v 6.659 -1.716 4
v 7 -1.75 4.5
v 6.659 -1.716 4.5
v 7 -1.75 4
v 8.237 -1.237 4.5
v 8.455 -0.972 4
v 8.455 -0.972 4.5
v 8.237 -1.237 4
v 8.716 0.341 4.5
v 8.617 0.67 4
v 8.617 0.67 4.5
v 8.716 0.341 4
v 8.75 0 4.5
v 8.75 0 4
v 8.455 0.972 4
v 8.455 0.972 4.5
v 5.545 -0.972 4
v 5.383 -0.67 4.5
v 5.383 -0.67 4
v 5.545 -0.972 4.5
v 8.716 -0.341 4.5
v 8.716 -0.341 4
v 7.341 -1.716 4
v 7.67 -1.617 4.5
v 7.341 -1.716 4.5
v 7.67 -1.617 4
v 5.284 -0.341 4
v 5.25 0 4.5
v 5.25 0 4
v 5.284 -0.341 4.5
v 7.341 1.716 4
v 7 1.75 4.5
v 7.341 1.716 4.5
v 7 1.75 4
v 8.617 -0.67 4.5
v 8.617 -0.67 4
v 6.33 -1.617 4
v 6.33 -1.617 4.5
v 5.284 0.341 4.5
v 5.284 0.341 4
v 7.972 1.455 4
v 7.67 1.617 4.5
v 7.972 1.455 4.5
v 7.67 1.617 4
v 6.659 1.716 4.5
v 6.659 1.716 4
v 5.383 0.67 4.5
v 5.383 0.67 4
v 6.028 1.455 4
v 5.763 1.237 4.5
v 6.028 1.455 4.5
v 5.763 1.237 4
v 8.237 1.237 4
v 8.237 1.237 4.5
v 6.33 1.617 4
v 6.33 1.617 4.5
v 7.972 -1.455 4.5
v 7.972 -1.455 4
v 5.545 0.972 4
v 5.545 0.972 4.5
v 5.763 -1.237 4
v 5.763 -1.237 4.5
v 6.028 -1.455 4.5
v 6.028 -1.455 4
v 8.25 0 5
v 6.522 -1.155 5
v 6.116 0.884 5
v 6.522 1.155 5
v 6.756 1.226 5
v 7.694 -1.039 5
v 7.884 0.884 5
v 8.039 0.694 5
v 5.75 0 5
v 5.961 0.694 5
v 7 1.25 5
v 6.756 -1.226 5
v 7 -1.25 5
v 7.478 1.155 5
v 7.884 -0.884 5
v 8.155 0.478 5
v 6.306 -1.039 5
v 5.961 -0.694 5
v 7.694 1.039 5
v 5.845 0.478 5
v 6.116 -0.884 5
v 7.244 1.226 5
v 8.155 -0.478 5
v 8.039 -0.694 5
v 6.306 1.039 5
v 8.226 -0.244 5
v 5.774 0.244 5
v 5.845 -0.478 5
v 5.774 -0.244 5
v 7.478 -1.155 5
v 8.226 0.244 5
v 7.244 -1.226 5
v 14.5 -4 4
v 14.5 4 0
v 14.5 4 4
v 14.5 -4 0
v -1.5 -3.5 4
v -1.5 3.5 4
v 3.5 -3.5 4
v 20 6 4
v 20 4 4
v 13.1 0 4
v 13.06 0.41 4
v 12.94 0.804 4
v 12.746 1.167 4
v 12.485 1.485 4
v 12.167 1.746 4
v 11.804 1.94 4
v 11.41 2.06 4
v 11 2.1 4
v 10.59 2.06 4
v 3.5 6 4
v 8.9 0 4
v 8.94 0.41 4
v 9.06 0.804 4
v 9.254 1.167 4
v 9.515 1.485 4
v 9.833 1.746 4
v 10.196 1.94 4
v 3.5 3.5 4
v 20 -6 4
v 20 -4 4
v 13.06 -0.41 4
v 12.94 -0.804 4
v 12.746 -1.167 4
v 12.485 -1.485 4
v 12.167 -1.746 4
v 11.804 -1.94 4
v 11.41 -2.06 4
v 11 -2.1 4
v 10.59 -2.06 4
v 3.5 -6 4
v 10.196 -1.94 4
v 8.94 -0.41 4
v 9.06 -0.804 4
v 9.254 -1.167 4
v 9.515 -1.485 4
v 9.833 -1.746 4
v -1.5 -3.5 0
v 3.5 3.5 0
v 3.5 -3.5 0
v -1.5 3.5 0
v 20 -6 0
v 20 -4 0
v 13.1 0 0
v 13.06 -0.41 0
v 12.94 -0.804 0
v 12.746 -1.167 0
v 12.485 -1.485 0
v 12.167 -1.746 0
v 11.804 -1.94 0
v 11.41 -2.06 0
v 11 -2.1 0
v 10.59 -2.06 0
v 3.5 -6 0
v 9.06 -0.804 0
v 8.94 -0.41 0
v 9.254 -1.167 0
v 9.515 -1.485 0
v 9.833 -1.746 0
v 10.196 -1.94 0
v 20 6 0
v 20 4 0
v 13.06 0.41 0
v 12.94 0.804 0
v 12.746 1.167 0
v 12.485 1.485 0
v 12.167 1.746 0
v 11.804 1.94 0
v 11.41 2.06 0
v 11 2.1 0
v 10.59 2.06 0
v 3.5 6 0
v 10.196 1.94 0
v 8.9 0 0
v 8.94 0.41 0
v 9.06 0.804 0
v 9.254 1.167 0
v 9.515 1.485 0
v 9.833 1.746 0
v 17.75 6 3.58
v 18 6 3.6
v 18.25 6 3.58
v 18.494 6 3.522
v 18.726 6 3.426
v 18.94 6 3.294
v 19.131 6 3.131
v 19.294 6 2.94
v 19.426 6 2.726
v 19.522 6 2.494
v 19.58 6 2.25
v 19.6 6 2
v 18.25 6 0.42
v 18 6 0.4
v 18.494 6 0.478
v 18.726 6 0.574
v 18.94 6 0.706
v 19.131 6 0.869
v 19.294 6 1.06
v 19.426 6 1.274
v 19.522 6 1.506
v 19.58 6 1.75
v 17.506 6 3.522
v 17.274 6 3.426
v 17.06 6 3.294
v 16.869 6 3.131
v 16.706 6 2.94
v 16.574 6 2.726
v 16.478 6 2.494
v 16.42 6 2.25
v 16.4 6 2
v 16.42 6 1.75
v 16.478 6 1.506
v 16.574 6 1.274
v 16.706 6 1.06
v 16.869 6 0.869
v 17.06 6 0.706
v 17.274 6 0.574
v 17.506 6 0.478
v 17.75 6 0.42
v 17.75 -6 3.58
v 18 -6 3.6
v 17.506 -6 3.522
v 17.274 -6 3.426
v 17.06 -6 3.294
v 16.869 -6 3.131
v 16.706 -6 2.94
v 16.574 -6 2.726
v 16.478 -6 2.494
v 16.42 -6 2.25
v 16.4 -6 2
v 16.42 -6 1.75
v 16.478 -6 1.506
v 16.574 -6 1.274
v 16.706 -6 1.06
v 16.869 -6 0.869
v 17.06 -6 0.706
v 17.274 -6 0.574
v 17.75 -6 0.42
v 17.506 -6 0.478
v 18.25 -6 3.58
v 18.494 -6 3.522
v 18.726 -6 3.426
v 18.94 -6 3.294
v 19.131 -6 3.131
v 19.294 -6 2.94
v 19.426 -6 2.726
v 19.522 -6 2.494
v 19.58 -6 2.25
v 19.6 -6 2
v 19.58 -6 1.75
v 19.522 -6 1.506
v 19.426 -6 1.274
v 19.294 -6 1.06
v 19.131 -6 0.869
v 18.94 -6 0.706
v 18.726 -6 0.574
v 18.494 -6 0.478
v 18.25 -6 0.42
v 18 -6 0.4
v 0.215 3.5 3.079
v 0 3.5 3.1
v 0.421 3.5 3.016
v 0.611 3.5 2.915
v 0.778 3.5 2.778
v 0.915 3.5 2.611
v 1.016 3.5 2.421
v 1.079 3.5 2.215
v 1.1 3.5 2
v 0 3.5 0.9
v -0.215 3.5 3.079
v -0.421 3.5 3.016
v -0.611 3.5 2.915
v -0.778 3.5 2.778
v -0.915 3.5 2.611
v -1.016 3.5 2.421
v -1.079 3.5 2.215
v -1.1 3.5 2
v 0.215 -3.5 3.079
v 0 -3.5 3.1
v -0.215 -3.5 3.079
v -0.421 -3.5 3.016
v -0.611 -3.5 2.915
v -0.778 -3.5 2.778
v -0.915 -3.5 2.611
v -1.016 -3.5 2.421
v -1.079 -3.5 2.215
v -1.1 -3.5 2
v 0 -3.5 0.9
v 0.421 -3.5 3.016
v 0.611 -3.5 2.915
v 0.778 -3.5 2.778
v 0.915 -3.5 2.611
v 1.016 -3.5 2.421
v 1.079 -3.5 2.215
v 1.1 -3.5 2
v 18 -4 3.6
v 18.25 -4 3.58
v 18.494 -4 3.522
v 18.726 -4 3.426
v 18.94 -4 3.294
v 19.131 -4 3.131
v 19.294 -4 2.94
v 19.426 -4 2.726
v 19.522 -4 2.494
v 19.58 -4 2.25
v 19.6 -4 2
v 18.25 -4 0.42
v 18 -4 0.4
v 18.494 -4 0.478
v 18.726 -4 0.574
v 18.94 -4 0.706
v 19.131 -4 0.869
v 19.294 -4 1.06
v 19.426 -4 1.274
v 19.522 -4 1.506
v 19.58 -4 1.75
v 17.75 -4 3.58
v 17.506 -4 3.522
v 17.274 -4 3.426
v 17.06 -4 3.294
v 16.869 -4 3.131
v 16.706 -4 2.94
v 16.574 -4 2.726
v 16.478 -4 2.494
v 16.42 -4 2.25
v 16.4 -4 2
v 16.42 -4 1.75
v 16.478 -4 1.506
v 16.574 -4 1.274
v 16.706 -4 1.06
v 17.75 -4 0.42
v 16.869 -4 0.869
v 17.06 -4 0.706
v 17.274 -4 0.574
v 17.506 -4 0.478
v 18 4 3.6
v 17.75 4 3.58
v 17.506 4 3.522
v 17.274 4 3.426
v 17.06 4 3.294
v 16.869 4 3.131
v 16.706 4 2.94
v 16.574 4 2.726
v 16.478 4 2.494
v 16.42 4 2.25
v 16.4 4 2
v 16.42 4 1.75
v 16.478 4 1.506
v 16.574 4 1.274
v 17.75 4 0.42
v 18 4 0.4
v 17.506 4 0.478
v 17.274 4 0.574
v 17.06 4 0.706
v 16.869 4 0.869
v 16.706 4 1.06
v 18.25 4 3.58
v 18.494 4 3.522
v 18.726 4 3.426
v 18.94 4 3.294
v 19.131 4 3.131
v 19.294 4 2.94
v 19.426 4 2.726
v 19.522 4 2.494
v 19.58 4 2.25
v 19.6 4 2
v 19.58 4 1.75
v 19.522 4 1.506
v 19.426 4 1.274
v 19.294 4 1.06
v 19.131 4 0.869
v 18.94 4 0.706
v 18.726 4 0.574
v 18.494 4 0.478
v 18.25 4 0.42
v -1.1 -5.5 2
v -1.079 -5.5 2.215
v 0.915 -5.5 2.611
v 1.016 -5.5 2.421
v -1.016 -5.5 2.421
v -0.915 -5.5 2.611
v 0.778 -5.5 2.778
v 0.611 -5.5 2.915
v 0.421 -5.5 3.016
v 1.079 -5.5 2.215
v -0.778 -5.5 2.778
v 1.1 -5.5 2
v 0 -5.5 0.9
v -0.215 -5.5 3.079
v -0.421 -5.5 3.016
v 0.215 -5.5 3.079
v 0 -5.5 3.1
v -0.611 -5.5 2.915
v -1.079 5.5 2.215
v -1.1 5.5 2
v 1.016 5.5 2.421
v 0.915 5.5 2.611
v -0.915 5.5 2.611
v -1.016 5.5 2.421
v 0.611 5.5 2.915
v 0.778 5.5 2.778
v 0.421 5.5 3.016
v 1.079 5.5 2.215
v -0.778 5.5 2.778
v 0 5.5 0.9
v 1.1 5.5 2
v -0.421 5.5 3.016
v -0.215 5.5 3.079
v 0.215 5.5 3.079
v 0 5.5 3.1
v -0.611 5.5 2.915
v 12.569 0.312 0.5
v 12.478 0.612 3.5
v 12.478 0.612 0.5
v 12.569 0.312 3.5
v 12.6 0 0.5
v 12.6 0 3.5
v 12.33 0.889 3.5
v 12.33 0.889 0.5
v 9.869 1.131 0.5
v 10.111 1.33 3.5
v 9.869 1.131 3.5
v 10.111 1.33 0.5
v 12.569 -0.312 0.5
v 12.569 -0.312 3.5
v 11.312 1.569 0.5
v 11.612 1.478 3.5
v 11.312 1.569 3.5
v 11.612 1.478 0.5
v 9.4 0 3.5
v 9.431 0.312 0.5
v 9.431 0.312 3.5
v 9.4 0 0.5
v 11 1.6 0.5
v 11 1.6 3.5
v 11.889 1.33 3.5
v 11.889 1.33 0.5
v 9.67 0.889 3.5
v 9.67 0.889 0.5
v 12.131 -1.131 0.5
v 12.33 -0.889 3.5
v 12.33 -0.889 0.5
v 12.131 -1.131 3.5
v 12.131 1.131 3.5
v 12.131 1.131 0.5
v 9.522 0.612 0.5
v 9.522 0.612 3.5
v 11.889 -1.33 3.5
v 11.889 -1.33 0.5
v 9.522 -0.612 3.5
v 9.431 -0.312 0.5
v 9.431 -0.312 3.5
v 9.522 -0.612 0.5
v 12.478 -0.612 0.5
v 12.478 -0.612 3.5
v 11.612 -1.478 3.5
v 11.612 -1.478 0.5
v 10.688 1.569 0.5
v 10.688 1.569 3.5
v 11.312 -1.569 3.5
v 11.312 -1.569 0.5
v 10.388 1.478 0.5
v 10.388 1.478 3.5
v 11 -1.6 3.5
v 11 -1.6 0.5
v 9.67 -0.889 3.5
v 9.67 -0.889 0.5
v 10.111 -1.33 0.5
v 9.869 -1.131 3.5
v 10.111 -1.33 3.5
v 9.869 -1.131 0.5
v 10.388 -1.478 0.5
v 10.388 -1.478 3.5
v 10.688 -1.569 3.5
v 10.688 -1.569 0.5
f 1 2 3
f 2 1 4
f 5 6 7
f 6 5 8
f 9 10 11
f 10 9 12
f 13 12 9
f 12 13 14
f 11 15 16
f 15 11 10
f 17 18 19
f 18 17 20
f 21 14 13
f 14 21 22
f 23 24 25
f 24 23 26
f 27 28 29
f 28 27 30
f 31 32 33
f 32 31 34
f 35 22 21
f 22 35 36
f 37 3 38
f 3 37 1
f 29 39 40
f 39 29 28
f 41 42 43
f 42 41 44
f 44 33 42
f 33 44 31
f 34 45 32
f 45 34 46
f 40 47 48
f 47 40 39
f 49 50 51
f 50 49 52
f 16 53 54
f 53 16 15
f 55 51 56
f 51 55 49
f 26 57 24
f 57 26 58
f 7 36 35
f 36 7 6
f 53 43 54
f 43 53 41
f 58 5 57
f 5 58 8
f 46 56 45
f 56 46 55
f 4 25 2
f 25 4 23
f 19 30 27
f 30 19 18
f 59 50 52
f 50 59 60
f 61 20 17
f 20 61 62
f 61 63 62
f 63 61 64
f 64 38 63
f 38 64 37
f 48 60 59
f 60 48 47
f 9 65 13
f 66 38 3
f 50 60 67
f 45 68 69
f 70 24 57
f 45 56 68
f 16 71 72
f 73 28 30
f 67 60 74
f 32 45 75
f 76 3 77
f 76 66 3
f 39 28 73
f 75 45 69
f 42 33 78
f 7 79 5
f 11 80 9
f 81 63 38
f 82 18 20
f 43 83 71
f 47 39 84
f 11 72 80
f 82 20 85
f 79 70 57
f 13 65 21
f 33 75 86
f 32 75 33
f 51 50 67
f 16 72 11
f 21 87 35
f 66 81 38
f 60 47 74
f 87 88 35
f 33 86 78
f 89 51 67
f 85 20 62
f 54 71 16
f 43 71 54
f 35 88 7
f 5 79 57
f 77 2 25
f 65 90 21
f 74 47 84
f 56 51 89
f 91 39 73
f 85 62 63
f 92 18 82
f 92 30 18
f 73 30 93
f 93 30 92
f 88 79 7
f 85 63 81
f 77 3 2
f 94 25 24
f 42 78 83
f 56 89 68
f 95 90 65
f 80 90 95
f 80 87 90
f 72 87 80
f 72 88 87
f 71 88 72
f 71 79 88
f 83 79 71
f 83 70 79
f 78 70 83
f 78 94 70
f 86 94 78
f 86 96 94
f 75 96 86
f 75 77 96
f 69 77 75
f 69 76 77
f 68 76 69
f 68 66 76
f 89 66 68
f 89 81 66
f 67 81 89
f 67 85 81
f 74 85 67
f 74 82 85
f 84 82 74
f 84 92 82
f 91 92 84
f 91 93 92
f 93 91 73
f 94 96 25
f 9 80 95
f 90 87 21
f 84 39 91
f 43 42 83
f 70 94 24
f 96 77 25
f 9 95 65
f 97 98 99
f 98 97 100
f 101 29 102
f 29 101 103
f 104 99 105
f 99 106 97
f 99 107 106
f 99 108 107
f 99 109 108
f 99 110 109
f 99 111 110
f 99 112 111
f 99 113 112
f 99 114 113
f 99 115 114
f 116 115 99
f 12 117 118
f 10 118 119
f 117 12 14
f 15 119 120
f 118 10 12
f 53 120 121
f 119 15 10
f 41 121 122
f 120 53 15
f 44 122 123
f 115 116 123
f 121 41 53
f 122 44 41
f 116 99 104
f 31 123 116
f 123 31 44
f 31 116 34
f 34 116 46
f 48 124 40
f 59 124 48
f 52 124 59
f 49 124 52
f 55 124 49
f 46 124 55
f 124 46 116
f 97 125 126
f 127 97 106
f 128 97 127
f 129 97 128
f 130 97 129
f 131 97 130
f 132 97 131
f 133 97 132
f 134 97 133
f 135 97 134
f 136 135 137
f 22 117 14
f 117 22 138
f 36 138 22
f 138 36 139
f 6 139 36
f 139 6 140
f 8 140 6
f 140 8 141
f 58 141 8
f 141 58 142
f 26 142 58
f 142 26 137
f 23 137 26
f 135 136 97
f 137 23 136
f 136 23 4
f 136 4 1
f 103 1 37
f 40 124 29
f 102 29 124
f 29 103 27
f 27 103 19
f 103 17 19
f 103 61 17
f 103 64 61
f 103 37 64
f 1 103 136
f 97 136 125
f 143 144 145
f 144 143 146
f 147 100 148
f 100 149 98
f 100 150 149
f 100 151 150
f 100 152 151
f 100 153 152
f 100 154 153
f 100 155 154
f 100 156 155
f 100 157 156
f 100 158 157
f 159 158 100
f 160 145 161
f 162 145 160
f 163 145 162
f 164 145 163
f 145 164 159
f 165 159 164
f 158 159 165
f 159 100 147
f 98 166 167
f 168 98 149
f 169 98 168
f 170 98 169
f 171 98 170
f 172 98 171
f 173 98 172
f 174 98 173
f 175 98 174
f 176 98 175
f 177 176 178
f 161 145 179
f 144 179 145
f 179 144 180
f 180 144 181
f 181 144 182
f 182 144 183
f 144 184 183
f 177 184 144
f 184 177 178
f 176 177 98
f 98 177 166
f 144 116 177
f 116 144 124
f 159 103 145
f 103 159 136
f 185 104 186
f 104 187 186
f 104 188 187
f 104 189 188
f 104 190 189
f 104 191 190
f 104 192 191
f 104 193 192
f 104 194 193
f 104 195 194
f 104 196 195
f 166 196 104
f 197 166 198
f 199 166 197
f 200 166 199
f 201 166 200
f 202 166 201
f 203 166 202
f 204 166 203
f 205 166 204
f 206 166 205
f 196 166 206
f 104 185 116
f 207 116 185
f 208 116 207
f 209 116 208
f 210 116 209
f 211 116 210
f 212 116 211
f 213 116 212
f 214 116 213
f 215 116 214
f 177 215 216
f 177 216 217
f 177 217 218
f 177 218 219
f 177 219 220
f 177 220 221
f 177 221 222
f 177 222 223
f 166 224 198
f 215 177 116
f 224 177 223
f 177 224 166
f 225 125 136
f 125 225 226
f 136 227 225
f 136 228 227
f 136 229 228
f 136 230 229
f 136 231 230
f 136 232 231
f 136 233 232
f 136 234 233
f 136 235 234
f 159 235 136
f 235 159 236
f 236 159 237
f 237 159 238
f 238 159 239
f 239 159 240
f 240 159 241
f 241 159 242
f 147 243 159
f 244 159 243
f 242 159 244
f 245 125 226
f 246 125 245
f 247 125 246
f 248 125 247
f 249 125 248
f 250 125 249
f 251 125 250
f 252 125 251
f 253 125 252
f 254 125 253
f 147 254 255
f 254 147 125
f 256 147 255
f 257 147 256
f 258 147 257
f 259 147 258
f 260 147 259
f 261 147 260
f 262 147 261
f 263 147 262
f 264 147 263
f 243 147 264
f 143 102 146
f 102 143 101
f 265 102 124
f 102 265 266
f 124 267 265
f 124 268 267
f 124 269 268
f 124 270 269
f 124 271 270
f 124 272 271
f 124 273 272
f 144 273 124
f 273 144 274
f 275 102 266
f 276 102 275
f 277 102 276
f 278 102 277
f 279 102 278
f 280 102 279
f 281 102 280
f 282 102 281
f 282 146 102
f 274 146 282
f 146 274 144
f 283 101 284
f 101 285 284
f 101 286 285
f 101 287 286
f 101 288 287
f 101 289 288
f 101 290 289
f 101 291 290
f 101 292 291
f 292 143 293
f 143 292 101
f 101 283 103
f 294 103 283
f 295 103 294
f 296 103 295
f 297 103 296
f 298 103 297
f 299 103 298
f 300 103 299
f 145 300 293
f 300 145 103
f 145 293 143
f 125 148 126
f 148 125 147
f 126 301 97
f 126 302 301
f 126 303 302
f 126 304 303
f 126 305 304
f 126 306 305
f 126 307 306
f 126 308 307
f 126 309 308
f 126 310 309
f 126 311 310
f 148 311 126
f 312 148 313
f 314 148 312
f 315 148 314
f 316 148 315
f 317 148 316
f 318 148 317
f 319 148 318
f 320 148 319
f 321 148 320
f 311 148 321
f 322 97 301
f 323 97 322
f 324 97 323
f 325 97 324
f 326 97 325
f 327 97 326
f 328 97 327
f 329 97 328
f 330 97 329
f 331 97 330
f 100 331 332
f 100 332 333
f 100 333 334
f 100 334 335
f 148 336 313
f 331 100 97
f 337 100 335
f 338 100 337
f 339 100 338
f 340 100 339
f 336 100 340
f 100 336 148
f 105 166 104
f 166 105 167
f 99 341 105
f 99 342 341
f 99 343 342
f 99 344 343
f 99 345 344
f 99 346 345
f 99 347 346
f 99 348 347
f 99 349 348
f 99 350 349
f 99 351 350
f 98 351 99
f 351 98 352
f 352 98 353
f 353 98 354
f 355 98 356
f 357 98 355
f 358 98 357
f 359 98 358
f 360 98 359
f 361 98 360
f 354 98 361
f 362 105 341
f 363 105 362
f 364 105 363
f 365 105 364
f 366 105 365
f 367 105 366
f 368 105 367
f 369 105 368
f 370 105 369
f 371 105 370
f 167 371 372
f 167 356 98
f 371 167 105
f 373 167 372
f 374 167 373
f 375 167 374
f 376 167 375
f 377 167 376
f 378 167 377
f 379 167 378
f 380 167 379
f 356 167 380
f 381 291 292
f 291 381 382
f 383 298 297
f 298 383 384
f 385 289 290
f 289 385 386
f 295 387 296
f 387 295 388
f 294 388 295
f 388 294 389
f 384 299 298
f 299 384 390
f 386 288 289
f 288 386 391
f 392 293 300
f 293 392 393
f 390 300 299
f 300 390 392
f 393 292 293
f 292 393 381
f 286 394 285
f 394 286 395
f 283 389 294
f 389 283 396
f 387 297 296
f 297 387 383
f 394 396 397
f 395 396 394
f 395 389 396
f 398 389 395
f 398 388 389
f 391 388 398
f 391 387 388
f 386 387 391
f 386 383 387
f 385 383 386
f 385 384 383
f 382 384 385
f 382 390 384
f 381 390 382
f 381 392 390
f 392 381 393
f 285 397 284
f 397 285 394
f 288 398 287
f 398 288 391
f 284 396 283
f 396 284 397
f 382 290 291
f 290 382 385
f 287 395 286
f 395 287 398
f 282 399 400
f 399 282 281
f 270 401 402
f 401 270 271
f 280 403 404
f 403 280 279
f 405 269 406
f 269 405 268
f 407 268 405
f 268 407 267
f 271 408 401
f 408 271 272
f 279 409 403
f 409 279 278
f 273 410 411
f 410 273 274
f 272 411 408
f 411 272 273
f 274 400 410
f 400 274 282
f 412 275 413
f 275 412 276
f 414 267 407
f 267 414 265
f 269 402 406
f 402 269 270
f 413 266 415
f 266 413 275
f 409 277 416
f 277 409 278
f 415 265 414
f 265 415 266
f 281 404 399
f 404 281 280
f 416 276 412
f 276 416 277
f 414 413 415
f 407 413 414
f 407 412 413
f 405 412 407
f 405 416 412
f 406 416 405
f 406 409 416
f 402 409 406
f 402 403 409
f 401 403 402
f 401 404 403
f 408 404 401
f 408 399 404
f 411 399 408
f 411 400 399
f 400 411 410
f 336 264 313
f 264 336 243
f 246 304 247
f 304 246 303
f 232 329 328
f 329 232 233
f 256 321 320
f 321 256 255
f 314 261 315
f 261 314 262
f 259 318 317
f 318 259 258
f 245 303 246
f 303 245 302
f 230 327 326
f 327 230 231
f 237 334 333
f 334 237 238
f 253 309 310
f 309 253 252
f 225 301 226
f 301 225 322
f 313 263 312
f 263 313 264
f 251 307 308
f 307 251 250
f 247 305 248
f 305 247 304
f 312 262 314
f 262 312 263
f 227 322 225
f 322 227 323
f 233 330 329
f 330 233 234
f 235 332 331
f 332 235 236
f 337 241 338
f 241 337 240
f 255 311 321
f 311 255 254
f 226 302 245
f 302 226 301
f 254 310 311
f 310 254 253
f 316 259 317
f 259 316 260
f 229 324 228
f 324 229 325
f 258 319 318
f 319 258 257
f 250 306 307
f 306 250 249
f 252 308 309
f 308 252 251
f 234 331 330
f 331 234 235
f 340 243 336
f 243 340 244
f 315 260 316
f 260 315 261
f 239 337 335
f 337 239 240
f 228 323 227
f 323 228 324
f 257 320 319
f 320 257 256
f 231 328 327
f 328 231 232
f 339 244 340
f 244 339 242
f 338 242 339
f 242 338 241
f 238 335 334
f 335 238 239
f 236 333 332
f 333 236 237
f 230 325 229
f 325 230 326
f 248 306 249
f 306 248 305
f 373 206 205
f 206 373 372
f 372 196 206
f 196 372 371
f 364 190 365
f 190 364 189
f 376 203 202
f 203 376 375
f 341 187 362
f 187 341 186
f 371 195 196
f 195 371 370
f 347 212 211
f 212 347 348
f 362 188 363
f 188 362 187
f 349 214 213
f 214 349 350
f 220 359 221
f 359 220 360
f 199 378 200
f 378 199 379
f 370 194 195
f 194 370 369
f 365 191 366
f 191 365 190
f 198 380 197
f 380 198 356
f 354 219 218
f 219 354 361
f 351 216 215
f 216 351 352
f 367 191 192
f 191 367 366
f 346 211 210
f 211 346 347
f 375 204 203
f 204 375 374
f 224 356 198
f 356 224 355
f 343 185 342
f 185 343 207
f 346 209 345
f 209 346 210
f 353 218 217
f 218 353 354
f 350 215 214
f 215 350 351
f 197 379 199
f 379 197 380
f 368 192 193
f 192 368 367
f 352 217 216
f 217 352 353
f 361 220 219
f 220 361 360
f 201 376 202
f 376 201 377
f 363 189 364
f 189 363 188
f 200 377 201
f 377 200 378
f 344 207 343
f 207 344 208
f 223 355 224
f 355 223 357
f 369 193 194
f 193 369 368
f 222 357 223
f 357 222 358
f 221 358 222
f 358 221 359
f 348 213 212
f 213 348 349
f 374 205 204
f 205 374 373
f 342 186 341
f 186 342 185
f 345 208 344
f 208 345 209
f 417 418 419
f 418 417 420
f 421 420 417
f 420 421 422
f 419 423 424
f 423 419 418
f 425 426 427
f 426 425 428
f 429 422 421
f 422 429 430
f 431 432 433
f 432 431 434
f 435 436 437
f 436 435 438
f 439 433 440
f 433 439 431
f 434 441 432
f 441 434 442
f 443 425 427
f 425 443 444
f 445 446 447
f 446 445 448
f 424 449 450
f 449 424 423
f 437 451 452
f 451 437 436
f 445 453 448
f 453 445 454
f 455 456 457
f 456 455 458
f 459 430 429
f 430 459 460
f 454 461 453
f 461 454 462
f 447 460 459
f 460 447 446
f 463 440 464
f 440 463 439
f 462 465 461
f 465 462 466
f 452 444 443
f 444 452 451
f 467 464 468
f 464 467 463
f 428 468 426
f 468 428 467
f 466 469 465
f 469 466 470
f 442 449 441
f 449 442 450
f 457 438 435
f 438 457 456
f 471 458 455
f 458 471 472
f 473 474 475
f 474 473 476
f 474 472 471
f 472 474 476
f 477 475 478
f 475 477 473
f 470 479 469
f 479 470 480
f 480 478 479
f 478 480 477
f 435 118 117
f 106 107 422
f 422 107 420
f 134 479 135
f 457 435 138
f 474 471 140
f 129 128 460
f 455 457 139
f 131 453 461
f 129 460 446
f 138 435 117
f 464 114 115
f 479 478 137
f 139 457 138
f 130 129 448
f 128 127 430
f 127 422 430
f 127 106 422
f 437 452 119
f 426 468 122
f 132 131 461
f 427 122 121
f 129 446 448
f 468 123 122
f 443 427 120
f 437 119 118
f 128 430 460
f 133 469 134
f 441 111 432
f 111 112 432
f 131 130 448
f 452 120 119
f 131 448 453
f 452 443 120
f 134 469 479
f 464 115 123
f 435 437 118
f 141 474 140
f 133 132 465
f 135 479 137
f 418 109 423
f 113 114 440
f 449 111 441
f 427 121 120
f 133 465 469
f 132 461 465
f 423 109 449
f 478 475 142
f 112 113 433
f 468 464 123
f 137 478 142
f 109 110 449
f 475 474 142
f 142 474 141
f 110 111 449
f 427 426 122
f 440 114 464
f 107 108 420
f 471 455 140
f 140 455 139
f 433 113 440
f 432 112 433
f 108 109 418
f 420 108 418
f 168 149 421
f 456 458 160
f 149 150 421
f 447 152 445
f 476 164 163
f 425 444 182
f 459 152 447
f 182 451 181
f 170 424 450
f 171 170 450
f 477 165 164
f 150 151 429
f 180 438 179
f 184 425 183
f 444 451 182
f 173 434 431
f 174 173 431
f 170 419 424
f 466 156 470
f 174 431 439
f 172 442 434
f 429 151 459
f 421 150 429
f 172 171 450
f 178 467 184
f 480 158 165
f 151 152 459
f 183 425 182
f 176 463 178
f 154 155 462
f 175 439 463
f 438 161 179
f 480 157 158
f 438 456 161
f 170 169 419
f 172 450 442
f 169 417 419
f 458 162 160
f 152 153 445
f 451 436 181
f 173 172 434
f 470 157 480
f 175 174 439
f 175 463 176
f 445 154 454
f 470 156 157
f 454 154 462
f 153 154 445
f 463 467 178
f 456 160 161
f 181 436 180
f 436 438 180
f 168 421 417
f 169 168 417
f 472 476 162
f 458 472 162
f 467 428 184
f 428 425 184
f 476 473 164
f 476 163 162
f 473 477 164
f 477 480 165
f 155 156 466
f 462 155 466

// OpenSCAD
// Bracelet of hinged links, printed in place
part = "link";
cadverify_only = "";
module instance(name, part, unit = 1) {
    echo(cadverify_instance = [name, part, unit]);
    if (cadverify_only == "" || cadverify_only == name) children();
}
P = 18; W = 12; Zc = 2.0;
Rp = 1.1; Rh = 1.6;
Ytong = 3.5;
Xrear = -1.5; Xsr = 3.5; Xsf = 14.5; Xlr = 13.5; Xfront = 20;
XpinF = 18;
studX = 7; studR = 1.75;
holeX = 11; holeR = 1.6;
module teardrop2D() {
    pts = concat([for (a=[0:180/16:180]) [Rp*cos(a), Zc+Rp*sin(a)]], [[0, Zc-Rp]]);
    polygon(pts);
}
module pin_stub(len) { linear_extrude(height=len) teardrop2D(); }
module stud_solid() {
    translate([studX, 0, 3.9]) cylinder(r=studR, h=0.6, $fn=32);
    translate([studX, 0, 4.5]) cylinder(r1=studR, r2=1.25, h=0.5, $fn=32);
}
module link() {
    difference() {
        union() {
            translate([Xsr, -6, 0]) cube([Xsf-Xsr, 12, 4]);
            translate([Xrear, -Ytong, 0]) cube([(4.5-Xrear), 7, 4]);
            translate([Xlr, -6, 0]) cube([Xfront-Xlr, 2, 4]);
            translate([Xlr, 4, 0]) cube([Xfront-Xlr, 2, 4]);
            translate([0, -2.5, 0]) rotate([90,0,0]) pin_stub(3.0);
            translate([0, 5.5, 0]) rotate([90,0,0]) pin_stub(3.0);
            stud_solid();
        }
        translate([XpinF, -6.1, Zc]) rotate([-90,0,0]) cylinder(r=Rh, h=2.2, $fn=40);
        translate([XpinF, 3.9, Zc]) rotate([-90,0,0]) cylinder(r=Rh, h=2.2, $fn=40);
        translate([holeX, 0, -0.1]) cylinder(r=holeR, h=4.2, $fn=32);
        translate([holeX, 0, 3.5]) cylinder(r1=holeR, r2=2.1, h=0.5, $fn=32);
        translate([holeX, 0, 0]) cylinder(r1=2.1, r2=holeR, h=0.5, $fn=32);
    }
}
if (part == "assembly") {
    echo(cadverify_spec = [
        ["bounds", [[-1.5, -6, 0], [56, 6, 5]]],
        ["support_faces", [["bed", "-z", 300]]],
        ["allowed_interferences", []],
        ["motions", [["joint_bend", ["link3"], "rotate", [36, 0, 2], [0, 1, 0], [-30, 30]]]],
        ["assembly_order", [[["link1"], [0, 0, 0]], [["link2"], [0, 0, -1]], [["link3"], [0, 0, -1]]]],
        ["print_in_place", 0.5],
        ["overhangs_allowed", [
            ["hole top bridge 3.2mm", [[16.4, 4, 3.0], [19.6, 6, 4]]],
            ["hole top bridge 3.2mm", [[16.4, -6, 3.0], [19.6, -4, 4]]],
            ["hole top bridge 3.2mm", [[34.4, 4, 3.0], [37.6, 6, 4]]],
            ["hole top bridge 3.2mm", [[34.4, -6, 3.0], [37.6, -4, 4]]],
            ["hole top bridge 3.2mm", [[52.4, 4, 3.0], [55.6, 6, 4]]],
            ["hole top bridge 3.2mm", [[52.4, -6, 3.0], [55.6, -4, 4]]]
        ]]
    ]);
    instance("link1", "link", 1) translate([0, 0, 0]) link();
    instance("link2", "link", 1) translate([18, 0, 0]) link();
    instance("link3", "link", 1) translate([36, 0, 0]) link();
} else {
    echo(cadverify_spec = [
        ["bounds", [[-1.5, -6, 0], [20, 6, 5]]],
        ["bodies", 1],
        ["through_holes", 3],
        ["support_faces", [["bed", "-z", 100]]],
        ["overhangs_allowed", [
            ["hole top bridge 3.2mm", [[16.4, 4, 3.0], [19.6, 6, 4]]],
            ["hole top bridge 3.2mm", [[16.4, -6, 3.0], [19.6, -4, 4]]]
        ]],
        ["copies", 3],
        ["details", [
            ["spine", "material", [[5, -5, 0], [9, 5, 4]], 0.9],
            ["slot", "void", [[14.5, -4, 0], [20, 4, 4]], 0.9],
            ["pin_hole", "hole", [18, -8, 2], [0, 1, 0], [[0, 3.2], [1, 3.2]]],
            ["snap_hole", "hole", [11, 0, 6], [0, 0, -1], [[0, 4.2], [0.5, 3.2], [3.5, 3.2]]],
            ["floor", "thickness", [9, 3, -1], [0, 0, 1], 4],
            ["snap", "view", [[5, -2, 4], [9, 2, 5]]]
        ]]
    ]);
    link();
}
